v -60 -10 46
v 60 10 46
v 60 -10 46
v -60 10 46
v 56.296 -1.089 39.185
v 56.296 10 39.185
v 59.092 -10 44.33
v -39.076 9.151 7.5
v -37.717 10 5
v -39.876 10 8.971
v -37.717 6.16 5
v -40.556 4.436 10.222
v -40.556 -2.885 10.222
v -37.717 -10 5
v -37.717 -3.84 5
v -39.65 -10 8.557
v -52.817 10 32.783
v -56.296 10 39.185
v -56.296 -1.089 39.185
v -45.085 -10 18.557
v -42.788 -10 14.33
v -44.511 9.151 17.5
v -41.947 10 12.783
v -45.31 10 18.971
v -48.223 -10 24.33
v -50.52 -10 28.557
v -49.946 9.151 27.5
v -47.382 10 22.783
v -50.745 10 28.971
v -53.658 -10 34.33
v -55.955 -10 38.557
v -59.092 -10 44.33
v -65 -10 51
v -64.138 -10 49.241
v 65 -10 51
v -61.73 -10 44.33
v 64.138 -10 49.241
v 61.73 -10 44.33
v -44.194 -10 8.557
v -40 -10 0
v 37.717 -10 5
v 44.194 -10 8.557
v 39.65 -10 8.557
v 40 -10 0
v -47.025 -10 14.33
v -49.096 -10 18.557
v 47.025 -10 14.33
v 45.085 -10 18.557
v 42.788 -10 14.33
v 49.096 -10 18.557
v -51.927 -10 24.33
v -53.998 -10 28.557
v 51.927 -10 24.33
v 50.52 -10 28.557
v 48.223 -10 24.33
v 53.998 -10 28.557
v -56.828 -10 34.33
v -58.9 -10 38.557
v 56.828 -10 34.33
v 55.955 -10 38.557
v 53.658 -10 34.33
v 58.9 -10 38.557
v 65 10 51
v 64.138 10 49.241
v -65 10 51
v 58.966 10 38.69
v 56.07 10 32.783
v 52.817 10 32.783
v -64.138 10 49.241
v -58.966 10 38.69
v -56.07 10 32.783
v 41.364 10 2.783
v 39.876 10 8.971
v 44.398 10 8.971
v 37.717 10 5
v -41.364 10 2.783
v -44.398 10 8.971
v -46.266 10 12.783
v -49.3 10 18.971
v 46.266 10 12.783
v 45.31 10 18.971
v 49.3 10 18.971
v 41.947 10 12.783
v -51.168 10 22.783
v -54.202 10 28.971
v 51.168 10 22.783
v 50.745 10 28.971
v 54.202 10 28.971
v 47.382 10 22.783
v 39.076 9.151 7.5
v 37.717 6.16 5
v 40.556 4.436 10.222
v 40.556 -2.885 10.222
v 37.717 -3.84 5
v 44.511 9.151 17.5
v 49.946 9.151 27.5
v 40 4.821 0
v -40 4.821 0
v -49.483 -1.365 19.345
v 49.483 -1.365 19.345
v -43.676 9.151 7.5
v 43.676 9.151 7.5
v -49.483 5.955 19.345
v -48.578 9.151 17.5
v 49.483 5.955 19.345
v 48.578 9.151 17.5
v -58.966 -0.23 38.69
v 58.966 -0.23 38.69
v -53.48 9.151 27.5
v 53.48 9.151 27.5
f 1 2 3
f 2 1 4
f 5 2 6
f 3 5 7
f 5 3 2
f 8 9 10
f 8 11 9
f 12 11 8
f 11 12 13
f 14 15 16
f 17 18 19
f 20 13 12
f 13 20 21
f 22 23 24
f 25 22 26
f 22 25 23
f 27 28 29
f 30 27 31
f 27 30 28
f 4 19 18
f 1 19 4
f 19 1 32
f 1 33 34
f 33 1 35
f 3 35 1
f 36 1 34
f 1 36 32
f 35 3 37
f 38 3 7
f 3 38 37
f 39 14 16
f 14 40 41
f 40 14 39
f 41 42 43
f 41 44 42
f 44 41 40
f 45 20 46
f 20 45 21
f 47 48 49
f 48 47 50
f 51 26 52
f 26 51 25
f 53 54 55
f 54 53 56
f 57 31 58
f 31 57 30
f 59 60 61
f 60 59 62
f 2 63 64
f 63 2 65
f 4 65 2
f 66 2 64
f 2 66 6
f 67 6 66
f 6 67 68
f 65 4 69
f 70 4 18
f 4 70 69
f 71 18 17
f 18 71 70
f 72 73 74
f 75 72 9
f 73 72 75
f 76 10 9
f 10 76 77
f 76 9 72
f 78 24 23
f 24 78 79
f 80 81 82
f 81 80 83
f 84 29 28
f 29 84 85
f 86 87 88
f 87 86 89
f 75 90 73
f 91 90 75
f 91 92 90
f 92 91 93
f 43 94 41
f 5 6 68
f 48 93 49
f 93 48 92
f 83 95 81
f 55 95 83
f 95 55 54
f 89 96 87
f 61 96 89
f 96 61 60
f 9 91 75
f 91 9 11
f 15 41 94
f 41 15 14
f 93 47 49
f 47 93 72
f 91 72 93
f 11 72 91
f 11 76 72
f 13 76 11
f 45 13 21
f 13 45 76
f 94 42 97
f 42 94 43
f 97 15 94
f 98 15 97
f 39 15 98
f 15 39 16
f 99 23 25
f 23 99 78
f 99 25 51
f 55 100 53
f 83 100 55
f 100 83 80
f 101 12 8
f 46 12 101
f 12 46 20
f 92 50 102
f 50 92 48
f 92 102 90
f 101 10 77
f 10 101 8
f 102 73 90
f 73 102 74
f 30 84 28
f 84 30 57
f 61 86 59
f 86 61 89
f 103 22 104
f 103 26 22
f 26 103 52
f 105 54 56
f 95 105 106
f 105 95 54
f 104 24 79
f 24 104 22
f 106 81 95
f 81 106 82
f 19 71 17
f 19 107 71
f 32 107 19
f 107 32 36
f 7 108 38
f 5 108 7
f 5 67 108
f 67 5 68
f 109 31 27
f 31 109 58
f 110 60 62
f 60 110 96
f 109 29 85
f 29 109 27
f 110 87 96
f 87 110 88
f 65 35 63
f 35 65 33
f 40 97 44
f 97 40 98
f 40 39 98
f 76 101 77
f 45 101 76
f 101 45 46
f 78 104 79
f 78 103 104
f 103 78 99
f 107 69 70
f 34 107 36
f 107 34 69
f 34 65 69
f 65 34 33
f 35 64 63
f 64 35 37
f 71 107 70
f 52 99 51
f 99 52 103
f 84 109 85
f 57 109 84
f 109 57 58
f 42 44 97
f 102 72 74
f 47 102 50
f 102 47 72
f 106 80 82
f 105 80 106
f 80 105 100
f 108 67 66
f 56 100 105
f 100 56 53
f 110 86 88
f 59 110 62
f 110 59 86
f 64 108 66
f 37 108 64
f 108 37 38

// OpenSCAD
wrench_length=[80,130];
handle_depth=[15,25];
handle_thickness=[5.5,7.5];
n_wrench = 4;
minimum_thickness = 5;

// Useful Functions that don't appear to be available in OpenSCAD
// Sum a Vector
function sum(v, i = 0, r = 0) = i < len(v) ? sum(v, i + 1, r + v[i]) : r;


module wrench_block(wrench_length,handle_depth,n_wrench,minimum_thickness,height,handle_thickness){    
    linear_extrude(height,
    scale=[wrench_length[1]/wrench_length[0],1])
    square([wrench_length[0],handle_depth[0]+minimum_thickness], center=true);
}

module wrench_block_1(wrench_length,handle_depth,n_wrench,minimum_thickness,height,handle_thickness){    
    rotate([90,0,0])
    linear_extrude(handle_depth[0]+minimum_thickness)
    polygon([[wrench_length[0]/2,0],[-wrench_length[0]/2,0],[-wrench_length[1]/2,height],[wrench_length[1]/2,height]]);
    }

module wrench_holder(wrench_length,handle_depth,n_wrench,minimum_thickness,height,handle_thickness){
    difference(){
        wrench_block(wrench_length,handle_depth,n_wrench,minimum_thickness,height);
        inside_width = wrench_length - [for (d=wrench_length) 2*minimum_thickness];
        difference(){
            wrench_block(inside_width,handle_depth,n_wrench,minimum_thickness,height-minimum_thickness);
            translate([-wrench_length[1]/2,-handle_depth[1]/2,0])
            cube([wrench_length[1],handle_depth[1],minimum_thickness]);
            }
        for (i=[1:n_wrench]){
            translate([-wrench_length[1]/2,-handle_depth[1]/2,2*i*minimum_thickness])
            rotate([-30,0,0])
            cube([wrench_length[1],handle_depth[1],5.0]);
            
            }
    }
  }


height=(n_wrench+1)*minimum_thickness+n_wrench*sum(handle_thickness)/2.0;
wrench_holder(wrench_length,handle_depth,n_wrench,minimum_thickness,height);
  
